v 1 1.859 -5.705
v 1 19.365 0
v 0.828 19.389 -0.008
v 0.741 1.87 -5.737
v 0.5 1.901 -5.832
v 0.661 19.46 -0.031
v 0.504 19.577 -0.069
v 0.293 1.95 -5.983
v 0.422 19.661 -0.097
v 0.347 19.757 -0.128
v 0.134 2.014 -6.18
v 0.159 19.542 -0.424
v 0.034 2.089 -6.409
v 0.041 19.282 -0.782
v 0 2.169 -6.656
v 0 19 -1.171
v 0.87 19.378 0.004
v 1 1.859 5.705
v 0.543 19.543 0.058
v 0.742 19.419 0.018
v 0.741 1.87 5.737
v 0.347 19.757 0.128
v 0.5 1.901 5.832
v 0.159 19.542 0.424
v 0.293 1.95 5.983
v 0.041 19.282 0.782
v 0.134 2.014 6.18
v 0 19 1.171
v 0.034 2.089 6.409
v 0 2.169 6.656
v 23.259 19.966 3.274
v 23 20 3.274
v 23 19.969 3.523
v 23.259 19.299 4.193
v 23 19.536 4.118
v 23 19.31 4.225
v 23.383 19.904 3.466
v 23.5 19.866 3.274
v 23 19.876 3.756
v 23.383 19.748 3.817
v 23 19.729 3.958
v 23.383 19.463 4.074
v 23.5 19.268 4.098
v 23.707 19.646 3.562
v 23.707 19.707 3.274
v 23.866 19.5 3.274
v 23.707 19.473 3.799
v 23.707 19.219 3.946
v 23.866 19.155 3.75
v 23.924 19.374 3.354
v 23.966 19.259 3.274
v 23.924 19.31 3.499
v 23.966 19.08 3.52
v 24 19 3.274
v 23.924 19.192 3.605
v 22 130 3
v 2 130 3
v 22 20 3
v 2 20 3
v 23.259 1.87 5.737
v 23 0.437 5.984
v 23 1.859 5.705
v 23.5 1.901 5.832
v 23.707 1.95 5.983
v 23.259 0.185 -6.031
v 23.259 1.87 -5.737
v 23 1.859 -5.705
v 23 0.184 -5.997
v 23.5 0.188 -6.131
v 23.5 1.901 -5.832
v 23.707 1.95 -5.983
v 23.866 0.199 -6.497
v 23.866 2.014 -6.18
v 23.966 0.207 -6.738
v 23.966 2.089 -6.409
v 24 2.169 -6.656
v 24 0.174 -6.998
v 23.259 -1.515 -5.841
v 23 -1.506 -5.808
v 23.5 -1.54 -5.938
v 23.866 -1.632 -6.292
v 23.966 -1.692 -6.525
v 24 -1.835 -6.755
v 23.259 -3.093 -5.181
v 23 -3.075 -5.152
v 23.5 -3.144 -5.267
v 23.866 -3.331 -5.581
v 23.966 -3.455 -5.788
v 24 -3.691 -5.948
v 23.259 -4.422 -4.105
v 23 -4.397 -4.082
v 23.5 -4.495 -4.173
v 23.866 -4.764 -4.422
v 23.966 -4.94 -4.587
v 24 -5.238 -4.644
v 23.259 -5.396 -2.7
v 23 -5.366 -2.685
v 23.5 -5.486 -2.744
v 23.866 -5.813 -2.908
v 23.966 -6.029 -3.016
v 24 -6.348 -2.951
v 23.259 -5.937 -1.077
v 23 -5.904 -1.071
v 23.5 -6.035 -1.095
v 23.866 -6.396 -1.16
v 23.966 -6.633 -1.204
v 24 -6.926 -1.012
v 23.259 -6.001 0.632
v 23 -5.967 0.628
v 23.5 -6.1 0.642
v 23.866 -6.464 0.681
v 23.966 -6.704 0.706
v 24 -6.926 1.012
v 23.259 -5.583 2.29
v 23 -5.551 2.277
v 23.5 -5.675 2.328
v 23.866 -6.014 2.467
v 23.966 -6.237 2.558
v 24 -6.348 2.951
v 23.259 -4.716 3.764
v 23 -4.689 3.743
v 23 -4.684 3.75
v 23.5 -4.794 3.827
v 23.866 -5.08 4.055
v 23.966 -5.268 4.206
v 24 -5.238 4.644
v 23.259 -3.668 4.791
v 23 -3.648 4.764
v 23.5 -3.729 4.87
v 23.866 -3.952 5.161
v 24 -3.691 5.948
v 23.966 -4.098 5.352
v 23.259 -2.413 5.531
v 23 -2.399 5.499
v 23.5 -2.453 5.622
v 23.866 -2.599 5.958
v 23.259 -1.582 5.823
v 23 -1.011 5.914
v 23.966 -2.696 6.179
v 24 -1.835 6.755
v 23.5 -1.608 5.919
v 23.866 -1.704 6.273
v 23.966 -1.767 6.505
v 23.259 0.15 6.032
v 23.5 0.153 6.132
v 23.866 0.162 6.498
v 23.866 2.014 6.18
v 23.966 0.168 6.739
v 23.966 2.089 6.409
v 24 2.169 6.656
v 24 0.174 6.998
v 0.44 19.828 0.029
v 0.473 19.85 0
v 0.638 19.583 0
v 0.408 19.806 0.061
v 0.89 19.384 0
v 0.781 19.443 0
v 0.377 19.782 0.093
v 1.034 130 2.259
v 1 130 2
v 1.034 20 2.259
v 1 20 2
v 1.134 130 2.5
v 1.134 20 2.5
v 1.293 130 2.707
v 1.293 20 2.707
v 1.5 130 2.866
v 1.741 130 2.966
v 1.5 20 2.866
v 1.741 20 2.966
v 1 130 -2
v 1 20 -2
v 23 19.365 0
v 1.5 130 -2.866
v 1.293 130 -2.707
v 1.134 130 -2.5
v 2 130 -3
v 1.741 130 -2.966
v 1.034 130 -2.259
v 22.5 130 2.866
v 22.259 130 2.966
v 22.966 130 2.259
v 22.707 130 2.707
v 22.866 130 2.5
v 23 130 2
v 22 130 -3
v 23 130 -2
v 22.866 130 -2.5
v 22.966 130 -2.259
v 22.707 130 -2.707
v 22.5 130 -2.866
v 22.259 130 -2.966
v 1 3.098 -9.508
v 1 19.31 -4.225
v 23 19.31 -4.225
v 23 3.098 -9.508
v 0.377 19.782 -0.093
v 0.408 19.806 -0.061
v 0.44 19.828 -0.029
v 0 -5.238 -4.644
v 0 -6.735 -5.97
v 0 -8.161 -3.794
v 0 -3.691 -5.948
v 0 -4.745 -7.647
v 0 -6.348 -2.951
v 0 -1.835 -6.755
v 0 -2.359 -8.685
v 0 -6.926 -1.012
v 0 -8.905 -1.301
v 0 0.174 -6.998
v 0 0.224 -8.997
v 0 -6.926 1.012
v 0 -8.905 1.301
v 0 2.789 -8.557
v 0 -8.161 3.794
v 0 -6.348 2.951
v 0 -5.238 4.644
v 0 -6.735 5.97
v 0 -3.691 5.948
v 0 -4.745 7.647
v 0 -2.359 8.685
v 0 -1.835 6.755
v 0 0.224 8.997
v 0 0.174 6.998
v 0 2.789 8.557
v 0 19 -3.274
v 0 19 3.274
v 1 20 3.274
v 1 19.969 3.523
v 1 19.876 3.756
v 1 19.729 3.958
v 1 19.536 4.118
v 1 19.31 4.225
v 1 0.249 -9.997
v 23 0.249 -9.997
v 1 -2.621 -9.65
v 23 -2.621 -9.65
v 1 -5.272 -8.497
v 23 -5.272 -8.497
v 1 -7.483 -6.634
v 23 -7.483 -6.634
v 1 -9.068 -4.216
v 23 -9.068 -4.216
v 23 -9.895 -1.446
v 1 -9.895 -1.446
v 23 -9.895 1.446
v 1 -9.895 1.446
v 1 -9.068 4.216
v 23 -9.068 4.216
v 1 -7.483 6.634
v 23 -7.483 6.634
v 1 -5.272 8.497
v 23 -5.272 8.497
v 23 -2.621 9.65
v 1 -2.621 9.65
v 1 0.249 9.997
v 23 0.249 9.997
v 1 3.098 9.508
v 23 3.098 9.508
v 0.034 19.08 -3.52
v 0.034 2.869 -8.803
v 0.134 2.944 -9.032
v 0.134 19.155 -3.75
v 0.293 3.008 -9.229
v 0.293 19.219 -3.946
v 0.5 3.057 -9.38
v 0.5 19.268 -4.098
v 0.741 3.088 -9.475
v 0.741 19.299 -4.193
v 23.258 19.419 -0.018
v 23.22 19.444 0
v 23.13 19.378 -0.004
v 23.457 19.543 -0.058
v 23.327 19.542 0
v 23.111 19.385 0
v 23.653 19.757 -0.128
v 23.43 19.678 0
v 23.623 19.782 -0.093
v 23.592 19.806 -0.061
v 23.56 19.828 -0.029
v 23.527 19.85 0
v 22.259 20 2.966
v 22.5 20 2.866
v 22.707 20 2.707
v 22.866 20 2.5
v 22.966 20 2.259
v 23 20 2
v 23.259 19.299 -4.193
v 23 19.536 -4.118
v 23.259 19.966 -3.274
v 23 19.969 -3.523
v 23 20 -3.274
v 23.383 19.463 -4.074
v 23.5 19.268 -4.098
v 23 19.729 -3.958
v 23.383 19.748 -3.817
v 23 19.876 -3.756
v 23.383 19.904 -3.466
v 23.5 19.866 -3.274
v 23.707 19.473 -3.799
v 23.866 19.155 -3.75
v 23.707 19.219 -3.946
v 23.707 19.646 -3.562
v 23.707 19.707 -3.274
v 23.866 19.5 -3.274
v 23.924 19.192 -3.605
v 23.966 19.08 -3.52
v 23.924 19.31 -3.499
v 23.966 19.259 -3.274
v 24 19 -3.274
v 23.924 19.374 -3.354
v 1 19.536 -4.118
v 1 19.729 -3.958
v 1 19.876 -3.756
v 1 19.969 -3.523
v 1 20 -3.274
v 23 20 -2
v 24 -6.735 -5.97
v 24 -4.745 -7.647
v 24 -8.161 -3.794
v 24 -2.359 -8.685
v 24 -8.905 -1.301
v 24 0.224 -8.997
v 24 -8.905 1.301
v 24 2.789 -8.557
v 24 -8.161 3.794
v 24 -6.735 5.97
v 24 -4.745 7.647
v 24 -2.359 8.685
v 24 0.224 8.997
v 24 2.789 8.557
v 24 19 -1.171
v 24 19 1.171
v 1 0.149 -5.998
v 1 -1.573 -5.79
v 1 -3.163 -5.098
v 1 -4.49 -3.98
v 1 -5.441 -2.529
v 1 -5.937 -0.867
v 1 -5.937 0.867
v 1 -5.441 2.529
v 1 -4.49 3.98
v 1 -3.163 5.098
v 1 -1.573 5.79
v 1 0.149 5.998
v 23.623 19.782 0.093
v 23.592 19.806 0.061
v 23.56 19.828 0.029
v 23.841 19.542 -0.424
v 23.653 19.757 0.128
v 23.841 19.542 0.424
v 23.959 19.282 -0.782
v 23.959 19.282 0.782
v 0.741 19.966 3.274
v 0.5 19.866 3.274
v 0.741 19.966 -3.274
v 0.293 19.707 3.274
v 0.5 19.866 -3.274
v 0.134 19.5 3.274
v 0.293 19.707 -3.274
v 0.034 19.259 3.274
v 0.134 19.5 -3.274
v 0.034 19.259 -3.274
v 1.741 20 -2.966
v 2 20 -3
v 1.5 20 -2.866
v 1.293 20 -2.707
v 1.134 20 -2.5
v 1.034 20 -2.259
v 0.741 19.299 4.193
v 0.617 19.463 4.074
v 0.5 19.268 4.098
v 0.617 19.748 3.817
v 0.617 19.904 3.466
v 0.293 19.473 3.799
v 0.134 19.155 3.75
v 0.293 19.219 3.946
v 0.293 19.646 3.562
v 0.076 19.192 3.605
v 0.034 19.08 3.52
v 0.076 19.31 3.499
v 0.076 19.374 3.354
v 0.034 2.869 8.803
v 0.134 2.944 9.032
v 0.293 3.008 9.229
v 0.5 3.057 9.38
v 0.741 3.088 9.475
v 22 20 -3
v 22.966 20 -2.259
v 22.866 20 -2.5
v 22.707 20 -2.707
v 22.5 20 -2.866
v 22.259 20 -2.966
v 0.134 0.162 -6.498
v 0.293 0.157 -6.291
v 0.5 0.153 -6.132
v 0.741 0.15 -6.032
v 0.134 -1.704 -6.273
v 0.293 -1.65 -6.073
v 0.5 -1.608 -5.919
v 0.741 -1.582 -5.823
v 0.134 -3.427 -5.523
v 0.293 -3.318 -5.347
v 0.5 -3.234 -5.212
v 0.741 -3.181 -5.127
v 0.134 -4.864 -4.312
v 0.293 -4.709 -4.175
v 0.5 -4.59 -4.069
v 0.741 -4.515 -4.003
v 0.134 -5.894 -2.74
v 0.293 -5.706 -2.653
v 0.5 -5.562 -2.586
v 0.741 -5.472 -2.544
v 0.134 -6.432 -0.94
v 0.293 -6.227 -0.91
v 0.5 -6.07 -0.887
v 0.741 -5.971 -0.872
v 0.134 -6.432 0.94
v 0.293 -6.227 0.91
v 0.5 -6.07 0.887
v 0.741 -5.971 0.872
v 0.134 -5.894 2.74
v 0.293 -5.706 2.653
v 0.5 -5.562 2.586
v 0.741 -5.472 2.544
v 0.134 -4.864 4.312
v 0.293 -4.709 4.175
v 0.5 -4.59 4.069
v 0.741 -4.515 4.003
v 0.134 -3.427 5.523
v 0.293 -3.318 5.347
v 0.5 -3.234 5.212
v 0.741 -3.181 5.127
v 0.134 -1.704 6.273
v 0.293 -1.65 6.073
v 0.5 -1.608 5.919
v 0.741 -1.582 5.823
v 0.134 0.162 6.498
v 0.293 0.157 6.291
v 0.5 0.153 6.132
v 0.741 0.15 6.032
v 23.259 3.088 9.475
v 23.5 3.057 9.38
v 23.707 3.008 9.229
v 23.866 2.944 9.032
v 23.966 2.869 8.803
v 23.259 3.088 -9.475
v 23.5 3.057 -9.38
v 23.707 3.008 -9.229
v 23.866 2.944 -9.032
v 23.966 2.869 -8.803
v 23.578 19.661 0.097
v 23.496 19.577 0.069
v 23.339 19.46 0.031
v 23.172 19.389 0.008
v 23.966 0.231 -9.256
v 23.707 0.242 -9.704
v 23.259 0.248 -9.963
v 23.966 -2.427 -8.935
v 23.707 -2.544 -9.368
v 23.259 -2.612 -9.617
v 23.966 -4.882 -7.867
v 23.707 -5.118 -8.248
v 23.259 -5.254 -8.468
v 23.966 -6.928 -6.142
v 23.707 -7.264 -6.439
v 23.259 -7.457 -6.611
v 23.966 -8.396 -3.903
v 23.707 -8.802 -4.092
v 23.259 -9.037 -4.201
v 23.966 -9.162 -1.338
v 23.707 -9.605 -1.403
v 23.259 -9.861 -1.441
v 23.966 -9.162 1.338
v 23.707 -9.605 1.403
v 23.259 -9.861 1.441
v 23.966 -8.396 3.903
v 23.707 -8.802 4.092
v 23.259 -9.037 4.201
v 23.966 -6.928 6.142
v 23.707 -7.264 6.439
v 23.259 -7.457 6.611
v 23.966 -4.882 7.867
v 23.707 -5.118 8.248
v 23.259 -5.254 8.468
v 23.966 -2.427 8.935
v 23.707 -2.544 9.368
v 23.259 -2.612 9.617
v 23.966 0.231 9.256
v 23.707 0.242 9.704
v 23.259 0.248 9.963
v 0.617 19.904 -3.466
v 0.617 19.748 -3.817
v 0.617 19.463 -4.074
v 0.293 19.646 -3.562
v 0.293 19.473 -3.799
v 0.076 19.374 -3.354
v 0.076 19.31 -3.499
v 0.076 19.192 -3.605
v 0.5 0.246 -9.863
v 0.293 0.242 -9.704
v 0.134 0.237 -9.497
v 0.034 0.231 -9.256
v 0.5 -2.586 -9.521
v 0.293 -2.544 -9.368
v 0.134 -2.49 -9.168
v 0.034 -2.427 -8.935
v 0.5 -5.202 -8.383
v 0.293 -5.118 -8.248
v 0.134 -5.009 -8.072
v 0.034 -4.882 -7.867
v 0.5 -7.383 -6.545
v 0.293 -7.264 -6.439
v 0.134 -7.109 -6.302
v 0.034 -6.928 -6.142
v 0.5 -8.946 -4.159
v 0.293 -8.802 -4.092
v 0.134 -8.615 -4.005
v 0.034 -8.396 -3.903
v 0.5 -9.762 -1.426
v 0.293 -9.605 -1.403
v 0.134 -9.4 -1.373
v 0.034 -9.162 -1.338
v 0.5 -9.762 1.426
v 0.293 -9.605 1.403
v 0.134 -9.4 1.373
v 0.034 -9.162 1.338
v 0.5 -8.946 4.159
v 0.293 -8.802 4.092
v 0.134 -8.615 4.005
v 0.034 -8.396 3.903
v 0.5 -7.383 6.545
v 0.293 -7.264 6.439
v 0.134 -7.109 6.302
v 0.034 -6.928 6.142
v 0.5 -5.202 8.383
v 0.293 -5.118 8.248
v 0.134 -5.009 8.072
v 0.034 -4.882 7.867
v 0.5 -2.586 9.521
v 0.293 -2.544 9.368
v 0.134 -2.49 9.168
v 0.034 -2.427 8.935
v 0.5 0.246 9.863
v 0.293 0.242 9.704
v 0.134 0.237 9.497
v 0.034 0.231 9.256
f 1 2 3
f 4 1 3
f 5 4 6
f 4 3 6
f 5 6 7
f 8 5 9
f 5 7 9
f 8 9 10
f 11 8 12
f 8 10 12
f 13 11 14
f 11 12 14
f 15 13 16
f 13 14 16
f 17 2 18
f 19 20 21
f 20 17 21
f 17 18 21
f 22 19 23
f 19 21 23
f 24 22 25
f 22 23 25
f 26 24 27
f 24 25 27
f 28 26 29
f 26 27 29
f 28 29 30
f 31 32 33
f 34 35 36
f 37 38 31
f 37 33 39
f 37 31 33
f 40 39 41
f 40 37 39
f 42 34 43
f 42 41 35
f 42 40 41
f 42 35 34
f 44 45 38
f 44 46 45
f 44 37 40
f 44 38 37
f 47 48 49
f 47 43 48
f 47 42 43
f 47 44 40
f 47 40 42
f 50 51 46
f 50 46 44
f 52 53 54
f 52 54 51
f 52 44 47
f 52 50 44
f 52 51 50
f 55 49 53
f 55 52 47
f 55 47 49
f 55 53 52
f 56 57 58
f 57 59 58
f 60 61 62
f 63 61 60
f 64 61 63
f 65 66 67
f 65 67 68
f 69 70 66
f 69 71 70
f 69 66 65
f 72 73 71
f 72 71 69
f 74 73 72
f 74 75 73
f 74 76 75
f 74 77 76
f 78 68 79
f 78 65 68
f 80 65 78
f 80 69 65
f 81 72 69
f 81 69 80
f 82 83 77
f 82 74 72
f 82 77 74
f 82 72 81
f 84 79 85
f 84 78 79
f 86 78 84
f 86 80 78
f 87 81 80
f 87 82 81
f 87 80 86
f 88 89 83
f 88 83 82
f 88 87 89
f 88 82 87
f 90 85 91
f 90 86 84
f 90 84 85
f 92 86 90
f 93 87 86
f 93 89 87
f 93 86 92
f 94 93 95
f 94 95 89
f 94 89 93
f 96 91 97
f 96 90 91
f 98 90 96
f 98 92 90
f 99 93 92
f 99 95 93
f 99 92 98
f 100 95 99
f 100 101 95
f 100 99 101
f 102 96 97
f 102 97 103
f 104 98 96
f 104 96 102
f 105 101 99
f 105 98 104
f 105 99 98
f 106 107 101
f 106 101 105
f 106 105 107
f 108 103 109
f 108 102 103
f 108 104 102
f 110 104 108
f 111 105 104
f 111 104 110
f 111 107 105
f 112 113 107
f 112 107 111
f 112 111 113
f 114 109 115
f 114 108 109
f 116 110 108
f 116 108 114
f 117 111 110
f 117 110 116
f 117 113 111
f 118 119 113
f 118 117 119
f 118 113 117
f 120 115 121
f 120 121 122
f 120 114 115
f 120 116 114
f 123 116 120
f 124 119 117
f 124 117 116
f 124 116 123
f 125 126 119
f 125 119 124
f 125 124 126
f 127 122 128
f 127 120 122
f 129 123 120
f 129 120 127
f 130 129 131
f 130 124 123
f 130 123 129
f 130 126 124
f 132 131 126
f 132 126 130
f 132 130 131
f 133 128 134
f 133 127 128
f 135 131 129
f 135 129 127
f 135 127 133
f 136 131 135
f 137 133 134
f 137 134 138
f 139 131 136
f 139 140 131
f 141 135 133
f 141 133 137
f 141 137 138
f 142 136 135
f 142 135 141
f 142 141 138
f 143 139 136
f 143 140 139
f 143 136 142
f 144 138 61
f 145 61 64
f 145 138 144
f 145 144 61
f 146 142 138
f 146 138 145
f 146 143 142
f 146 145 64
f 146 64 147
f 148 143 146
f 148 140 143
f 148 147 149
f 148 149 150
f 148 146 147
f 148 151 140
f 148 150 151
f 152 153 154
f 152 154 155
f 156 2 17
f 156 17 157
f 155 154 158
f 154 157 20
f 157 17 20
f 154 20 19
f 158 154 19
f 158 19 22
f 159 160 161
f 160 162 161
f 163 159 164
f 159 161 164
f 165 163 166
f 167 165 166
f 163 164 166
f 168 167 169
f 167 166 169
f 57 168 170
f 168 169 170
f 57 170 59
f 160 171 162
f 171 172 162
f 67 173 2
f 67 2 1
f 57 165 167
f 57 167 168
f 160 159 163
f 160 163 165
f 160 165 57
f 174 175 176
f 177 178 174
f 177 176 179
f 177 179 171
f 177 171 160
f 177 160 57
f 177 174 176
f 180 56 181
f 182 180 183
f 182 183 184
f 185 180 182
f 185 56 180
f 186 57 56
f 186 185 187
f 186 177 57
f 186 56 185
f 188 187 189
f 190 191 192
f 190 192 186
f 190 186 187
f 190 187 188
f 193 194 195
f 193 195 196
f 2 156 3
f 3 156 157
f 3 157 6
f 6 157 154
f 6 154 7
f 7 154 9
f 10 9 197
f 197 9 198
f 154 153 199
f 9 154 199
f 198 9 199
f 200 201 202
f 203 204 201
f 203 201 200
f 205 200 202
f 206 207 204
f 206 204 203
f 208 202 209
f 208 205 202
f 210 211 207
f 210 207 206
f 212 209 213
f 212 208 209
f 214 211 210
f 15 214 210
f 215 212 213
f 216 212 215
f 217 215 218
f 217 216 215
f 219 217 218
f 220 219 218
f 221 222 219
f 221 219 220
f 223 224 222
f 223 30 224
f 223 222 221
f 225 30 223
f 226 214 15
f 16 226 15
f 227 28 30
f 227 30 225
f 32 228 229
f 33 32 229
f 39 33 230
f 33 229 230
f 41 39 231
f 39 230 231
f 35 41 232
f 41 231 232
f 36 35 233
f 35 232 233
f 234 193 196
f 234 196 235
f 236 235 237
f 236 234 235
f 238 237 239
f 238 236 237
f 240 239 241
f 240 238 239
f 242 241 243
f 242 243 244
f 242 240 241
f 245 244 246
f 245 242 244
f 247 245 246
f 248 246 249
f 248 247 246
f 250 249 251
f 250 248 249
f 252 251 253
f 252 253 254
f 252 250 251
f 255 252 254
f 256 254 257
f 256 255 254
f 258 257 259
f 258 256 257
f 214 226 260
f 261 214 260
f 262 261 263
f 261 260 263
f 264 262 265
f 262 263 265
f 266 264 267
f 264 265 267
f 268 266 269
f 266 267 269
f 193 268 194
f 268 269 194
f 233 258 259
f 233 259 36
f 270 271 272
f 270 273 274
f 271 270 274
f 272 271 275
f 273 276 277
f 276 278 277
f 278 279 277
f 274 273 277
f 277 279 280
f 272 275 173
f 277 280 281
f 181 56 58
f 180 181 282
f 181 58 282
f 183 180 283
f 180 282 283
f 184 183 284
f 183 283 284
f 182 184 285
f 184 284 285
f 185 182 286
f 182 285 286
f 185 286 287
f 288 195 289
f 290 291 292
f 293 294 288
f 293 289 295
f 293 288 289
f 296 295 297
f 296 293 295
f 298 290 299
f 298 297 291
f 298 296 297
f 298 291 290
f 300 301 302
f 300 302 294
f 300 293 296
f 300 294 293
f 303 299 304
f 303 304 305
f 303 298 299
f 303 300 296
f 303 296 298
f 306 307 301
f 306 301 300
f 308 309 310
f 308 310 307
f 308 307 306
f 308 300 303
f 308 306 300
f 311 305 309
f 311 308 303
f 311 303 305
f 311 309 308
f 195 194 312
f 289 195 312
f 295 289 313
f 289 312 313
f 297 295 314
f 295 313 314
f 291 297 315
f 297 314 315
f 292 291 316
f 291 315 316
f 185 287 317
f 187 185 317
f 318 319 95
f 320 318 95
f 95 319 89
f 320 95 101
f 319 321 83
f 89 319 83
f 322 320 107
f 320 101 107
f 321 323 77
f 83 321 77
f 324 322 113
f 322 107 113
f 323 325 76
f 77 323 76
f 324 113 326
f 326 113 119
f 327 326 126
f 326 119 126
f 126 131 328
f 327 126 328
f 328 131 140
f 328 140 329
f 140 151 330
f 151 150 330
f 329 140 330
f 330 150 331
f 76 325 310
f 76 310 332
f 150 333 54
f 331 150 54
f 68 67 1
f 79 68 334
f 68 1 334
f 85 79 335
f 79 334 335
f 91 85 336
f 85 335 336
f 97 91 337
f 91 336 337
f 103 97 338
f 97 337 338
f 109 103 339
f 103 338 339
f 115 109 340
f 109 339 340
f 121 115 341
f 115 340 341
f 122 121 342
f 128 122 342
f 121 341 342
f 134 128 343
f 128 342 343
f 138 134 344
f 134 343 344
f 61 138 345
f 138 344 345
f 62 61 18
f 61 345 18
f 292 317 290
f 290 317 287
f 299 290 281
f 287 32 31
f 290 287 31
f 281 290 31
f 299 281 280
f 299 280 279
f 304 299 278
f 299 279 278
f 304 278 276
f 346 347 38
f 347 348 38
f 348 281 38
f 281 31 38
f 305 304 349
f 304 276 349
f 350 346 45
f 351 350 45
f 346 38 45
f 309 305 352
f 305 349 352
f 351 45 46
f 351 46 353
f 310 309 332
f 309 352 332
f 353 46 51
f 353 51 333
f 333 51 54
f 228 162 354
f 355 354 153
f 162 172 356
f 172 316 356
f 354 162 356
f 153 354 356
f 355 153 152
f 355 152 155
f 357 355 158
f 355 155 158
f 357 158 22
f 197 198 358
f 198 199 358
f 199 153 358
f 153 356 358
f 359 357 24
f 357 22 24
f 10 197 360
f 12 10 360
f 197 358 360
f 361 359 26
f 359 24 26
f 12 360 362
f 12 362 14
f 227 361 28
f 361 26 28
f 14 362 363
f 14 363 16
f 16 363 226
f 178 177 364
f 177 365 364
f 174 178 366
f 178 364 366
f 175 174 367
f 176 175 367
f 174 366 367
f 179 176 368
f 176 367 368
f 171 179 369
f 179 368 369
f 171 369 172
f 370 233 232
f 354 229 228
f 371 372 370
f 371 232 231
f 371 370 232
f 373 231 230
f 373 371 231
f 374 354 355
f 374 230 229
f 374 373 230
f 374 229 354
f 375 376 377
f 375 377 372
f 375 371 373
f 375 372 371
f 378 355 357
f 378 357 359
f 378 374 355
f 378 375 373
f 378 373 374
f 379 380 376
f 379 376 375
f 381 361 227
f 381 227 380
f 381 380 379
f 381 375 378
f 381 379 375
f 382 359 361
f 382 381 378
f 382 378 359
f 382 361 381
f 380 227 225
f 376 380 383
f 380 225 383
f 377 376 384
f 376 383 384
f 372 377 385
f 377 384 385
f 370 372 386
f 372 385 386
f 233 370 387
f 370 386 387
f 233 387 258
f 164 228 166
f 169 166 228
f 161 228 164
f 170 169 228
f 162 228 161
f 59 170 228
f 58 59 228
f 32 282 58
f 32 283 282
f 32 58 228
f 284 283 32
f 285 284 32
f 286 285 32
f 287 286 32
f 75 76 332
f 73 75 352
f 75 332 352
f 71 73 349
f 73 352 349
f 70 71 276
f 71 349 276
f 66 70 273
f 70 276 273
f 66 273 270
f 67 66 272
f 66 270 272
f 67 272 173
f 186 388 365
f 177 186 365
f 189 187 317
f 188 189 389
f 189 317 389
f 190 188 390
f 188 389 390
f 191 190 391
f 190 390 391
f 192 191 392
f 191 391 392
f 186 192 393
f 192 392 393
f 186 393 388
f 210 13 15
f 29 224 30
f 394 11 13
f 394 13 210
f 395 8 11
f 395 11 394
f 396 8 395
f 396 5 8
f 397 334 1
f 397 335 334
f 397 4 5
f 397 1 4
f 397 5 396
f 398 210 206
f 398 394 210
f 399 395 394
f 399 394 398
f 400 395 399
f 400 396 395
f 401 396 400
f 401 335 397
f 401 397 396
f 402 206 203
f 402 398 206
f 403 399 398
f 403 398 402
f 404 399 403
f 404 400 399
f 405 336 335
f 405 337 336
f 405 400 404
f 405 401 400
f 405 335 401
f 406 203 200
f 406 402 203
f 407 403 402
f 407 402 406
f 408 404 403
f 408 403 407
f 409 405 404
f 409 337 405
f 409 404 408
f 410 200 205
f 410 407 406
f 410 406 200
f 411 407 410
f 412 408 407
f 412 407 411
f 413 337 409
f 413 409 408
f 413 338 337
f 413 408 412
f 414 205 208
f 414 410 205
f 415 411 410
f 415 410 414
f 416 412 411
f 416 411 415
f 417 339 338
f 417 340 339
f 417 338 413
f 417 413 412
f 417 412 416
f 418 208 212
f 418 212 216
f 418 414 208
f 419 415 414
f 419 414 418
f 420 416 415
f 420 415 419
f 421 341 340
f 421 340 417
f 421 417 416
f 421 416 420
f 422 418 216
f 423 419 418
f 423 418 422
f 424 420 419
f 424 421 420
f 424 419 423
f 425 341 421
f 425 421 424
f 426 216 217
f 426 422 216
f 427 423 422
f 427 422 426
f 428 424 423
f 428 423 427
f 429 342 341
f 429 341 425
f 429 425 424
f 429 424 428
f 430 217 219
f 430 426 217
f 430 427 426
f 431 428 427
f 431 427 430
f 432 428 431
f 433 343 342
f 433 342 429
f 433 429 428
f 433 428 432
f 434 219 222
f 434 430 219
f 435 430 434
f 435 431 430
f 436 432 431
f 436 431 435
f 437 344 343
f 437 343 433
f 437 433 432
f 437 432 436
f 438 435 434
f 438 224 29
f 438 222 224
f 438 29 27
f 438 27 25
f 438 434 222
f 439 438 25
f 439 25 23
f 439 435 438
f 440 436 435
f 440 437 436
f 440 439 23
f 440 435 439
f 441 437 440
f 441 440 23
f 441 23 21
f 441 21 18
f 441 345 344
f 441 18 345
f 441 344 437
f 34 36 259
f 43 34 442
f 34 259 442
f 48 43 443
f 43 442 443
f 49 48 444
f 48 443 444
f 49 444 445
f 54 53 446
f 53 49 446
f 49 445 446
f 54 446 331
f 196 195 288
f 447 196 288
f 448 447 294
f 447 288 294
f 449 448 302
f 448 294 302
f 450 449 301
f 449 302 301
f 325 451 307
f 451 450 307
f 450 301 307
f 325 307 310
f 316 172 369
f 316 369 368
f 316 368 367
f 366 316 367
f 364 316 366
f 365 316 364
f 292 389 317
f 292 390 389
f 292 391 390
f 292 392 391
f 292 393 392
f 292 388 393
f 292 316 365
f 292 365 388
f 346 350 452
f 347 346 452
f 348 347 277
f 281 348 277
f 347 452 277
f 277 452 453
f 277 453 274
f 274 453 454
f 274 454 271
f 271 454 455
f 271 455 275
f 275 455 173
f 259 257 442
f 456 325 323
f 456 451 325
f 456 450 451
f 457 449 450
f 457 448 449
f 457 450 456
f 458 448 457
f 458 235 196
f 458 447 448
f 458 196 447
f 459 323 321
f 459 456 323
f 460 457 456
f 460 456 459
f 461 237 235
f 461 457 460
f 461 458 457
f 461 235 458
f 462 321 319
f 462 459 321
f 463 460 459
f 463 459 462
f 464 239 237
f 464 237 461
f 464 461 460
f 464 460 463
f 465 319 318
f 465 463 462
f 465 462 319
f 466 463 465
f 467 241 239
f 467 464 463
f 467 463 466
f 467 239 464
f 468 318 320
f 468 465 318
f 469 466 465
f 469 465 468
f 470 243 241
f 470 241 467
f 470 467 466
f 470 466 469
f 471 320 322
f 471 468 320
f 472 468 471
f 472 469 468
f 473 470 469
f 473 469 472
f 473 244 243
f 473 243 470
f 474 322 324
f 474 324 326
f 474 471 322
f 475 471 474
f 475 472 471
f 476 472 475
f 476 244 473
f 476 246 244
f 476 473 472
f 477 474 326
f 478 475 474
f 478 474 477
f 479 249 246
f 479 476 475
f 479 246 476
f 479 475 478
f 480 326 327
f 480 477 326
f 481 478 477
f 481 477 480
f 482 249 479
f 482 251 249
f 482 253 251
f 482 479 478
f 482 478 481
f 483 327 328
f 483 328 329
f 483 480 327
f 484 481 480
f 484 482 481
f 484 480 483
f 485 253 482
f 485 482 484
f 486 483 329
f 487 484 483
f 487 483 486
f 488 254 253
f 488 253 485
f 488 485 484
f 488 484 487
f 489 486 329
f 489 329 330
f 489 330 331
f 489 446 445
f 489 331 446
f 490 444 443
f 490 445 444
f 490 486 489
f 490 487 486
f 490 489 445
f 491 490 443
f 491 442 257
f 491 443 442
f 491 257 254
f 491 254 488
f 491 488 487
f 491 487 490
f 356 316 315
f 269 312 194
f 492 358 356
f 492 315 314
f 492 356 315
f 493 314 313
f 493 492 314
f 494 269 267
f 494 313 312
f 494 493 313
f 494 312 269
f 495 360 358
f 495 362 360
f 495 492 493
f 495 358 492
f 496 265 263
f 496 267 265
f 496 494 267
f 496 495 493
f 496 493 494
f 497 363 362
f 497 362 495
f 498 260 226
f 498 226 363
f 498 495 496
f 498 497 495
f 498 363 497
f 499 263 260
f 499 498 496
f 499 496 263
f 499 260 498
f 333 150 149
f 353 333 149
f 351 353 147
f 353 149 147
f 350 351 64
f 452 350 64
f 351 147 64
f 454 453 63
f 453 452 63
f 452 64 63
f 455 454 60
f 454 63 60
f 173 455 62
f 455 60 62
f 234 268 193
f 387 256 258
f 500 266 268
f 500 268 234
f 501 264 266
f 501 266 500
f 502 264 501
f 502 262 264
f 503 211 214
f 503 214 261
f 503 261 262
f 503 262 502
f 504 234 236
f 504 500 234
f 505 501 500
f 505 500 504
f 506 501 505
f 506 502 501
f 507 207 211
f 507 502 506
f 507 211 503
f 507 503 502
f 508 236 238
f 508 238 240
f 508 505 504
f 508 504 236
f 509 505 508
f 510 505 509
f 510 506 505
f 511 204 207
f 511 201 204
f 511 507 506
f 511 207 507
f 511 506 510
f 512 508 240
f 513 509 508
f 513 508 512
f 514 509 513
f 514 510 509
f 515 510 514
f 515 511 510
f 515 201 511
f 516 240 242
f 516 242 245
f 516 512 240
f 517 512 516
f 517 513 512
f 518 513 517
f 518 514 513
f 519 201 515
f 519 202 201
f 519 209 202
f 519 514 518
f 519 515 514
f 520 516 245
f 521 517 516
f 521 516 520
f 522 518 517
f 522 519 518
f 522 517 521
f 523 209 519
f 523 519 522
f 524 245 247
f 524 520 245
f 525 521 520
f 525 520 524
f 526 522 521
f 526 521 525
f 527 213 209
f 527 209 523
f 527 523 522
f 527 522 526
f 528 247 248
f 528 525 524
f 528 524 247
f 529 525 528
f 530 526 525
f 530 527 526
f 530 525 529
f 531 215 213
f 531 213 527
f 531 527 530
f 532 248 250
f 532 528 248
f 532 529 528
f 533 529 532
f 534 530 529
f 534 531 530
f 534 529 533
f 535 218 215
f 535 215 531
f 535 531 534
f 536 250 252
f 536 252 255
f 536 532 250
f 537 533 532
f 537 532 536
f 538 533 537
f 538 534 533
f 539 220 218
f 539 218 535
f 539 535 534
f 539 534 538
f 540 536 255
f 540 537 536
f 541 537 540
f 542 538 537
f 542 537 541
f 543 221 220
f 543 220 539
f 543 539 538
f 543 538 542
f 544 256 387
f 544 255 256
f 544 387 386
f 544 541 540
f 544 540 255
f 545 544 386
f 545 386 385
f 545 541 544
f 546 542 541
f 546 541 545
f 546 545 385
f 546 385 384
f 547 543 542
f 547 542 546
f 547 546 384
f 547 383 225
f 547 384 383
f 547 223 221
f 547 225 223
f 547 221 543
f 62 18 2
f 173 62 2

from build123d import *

# Parameters (mm, degrees)
BOSS_EXTRUDE1_DEPTH = 24
SKETCH2_W           = 24
SKETCH2_H           = 8
SKETCH2_W_2         = 22
SKETCH2_H_2         = 6
CUT_EXTRUDE1_DEPTH  = 40
FILLET1_R           = 1
FILLET2_R           = 1
BOSS_EXTRUDE2_DEPTH = 70


with BuildPart() as part:
    # Sketch1 → Boss-Extrude1 (new body)
    with BuildSketch(Plane(origin=(0, 0, 0), x_dir=(0, 0, -1), z_dir=(1, 0, 0))):
        with BuildLine():
            Line((-9.507879247, 3.098424151), (-4, 20))
            Line((-4, 20), (-4, 60))
            Line((-4, 60), (4, 60))
            Line((4, 60), (4, 20))
            Line((4, 20), (9.507879247, 3.098424151))
            ThreePointArc((9.507879247, 3.098424151), (0, -10), (-9.507879247, 3.098424151))
        make_face()
        with BuildLine():
            Line((-5.704727548, 1.85905449), (0, 19.364682524))
            Line((0, 19.364682524), (5.704727548, 1.85905449))
            ThreePointArc((5.704727548, 1.85905449), (0, -6), (-5.704727548, 1.85905449))
        make_face(mode=Mode.SUBTRACT)
    extrude(amount=BOSS_EXTRUDE1_DEPTH)

    # Sketch2 → Cut-Extrude1 (cut)
    with BuildSketch(Plane(origin=(0, 60, 0), x_dir=(1, 0, 0), z_dir=(0, 1, 0))):
        with Locations((12, 0)):
            Rectangle(SKETCH2_W, SKETCH2_H)
        with Locations((12, 0)):
            Rectangle(SKETCH2_W_2, SKETCH2_H_2, mode=Mode.SUBTRACT)
    extrude(amount=-CUT_EXTRUDE1_DEPTH, mode=Mode.SUBTRACT)

    # Fillet1
    # the kernel refuses this fillet: 1 mm, written as the material it takes off along each edge
    with BuildSketch(Plane(origin=(1, 19, 3.274120372), x_dir=(0, 0.3098424150516233, 0.9507879247418836), z_dir=(-1, 0, 0))) as fillet1_piece_1_section:
        Polygon((0, 0), (FILLET1_R * 1.02, 0), (FILLET1_R * 1.02, FILLET1_R * 0.740397220377), (FILLET1_R * 0.316039263353, FILLET1_R * 0.969803683237), align=None)
    fillet1_piece_1 = extrude(amount=FILLET1_R * 1.02, mode=Mode.PRIVATE)
    fillet1_piece_1 = fillet1_piece_1 - Plane(origin=(1, 19, 3.274120372), x_dir=(0, -0.8092720231948041, -0.5874340750026239), z_dir=(-1, 0, 0)) * Sphere(FILLET1_R, mode=Mode.PRIVATE)
    add(fillet1_piece_1, mode=Mode.SUBTRACT)
    with BuildSketch(Plane(origin=(23, 19, 3.274120372), x_dir=(0, 0.3098424150516233, 0.9507879247418836), z_dir=(1, 0, 0))) as fillet1_piece_2_section:
        Polygon((0, 0), (FILLET1_R * 1.02, 0), (FILLET1_R * 1.02, -FILLET1_R * 0.740397220377), (FILLET1_R * 0.316039263353, -FILLET1_R * 0.969803683237), align=None)
    fillet1_piece_2 = extrude(amount=FILLET1_R * 1.02, mode=Mode.PRIVATE)
    fillet1_piece_2 = fillet1_piece_2 - Plane(origin=(23, 19, 3.274120372), x_dir=(0, -0.8092720231948041, -0.5874340750026239), z_dir=(1, 0, 0)) * Sphere(FILLET1_R, mode=Mode.PRIVATE)
    add(fillet1_piece_2, mode=Mode.SUBTRACT)
    with BuildSketch(Plane(origin=(1, 19, -3.274120372), x_dir=(0, 0.3098424150516232, -0.9507879247418838), z_dir=(-1, 0, 0))) as fillet1_piece_3_section:
        Polygon((0, 0), (FILLET1_R * 1.02, 0), (FILLET1_R * 1.02, -FILLET1_R * 0.740397220377), (FILLET1_R * 0.316039263353, -FILLET1_R * 0.969803683237), align=None)
    fillet1_piece_3 = extrude(amount=FILLET1_R * 1.02, mode=Mode.PRIVATE)
    fillet1_piece_3 = fillet1_piece_3 - Plane(origin=(1, 19, -3.274120372), x_dir=(0, -0.8092720231948041, 0.587434075002624), z_dir=(-1, 0, 0)) * Sphere(FILLET1_R, mode=Mode.PRIVATE)
    add(fillet1_piece_3, mode=Mode.SUBTRACT)
    with BuildSketch(Plane(origin=(23, 19, -3.274120372), x_dir=(0, 0.3098424150516232, -0.9507879247418838), z_dir=(1, 0, 0))) as fillet1_piece_4_section:
        Polygon((0, 0), (FILLET1_R * 1.02, 0), (FILLET1_R * 1.02, FILLET1_R * 0.740397220377), (FILLET1_R * 0.316039263353, FILLET1_R * 0.969803683237), align=None)
    fillet1_piece_4 = extrude(amount=FILLET1_R * 1.02, mode=Mode.PRIVATE)
    fillet1_piece_4 = fillet1_piece_4 - Plane(origin=(23, 19, -3.274120372), x_dir=(0, -0.8092720231948041, 0.587434075002624), z_dir=(1, 0, 0)) * Sphere(FILLET1_R, mode=Mode.PRIVATE)
    add(fillet1_piece_4, mode=Mode.SUBTRACT)
    with BuildSketch(Plane(origin=(1, 20, 4), x_dir=(0, -0.9507879247418841, 0.30984241505162113), z_dir=(1, 0, 0)), Plane(origin=(1, 20, -4), x_dir=(0, 0, 1), z_dir=(1, 0, 0))) as fillet1_piece_5:
        with BuildLine():
            CenterArc((FILLET1_R * 0.725879627821, FILLET1_R), FILLET1_R, 198.04973395, 71.95026605)
            Line((-FILLET1_R * 0.224908296921, FILLET1_R * 0.690157584948), (-FILLET1_R * 0.243924055416, FILLET1_R * 0.683960736647))
            Line((-FILLET1_R * 0.243924055416, FILLET1_R * 0.683960736647), (-FILLET1_R * 0.0145175925564, -FILLET1_R * 0.02))
            Line((-FILLET1_R * 0.0145175925564, -FILLET1_R * 0.02), (FILLET1_R * 0.725879627821, -FILLET1_R * 0.02))
            Line((FILLET1_R * 0.725879627821, -FILLET1_R * 0.02), (FILLET1_R * 0.725879627821, 0))
        make_face()
    extrude(amount=22, mode=Mode.SUBTRACT)
    with BuildSketch(Plane(origin=(0, 0, 0), x_dir=(0, 0.3098424150516232, -0.9507879247418836), z_dir=(0, 0.9507879247418836, 0.3098424150516232))) as fillet1_piece_6:
        with BuildLine():
            CenterArc((6 + FILLET1_R, -FILLET1_R), FILLET1_R, 90, 90)
            Line((6, -FILLET1_R), (6 - FILLET1_R * 0.02, -FILLET1_R))
            Line((6 - FILLET1_R * 0.02, -FILLET1_R), (6 - FILLET1_R * 0.02, FILLET1_R * 0.02))
            Line((6 - FILLET1_R * 0.02, FILLET1_R * 0.02), (6 + FILLET1_R, FILLET1_R * 0.02))
            Line((6 + FILLET1_R, FILLET1_R * 0.02), (6 + FILLET1_R, 0))
        make_face()
    revolve(axis=Axis((0, 0, 0), (-1, 0, 0)), revolution_arc=216.0994679, mode=Mode.SUBTRACT)
    with BuildSketch(Plane(origin=(0, 21.741652336, 0.774606038), x_dir=(0, 0.30984241505162313, -0.9507879247418837), z_dir=(0, -0.9507879247418837, -0.30984241505162313))) as fillet1_piece_7_section:
        with BuildLine():
            CenterArc((FILLET1_R, FILLET1_R), FILLET1_R, 180, 90)
            Line((0, FILLET1_R), (-FILLET1_R * 0.02, FILLET1_R))
            Line((-FILLET1_R * 0.02, FILLET1_R), (-FILLET1_R * 0.02, -FILLET1_R * 0.02))
            Line((-FILLET1_R * 0.02, -FILLET1_R * 0.02), (FILLET1_R, -FILLET1_R * 0.02))
            Line((FILLET1_R, -FILLET1_R * 0.02), (FILLET1_R, 0))
        make_face()
    fillet1_piece_7 = extrude(amount=20.91170631, mode=Mode.PRIVATE)
    fillet1_piece_7 = split(fillet1_piece_7, bisect_by=Plane(origin=(0.224383955, 12.542231939, 2.223297658), z_dir=(0, -0.30984241505162313, -0.9507879247418837)), keep=Keep.TOP, mode=Mode.PRIVATE)
    add(fillet1_piece_7, mode=Mode.SUBTRACT)
    with BuildSketch(Plane(origin=(24, 3.098424151, 9.507879247), x_dir=(-1, 0, 0), z_dir=(0, 0.9507879247418836, -0.3098424150516233)), Plane(origin=(0, 19.309842415, -4.224908297), x_dir=(0, -0.3098424150516232, 0.9507879247418837), z_dir=(0, -0.9507879247418837, -0.3098424150516232))) as fillet1_piece_8:
        with BuildLine():
            CenterArc((FILLET1_R, -FILLET1_R), FILLET1_R, 90, 90)
            Line((0, -FILLET1_R), (-FILLET1_R * 0.02, -FILLET1_R))
            Line((-FILLET1_R * 0.02, -FILLET1_R), (-FILLET1_R * 0.02, FILLET1_R * 0.02))
            Line((-FILLET1_R * 0.02, FILLET1_R * 0.02), (FILLET1_R, FILLET1_R * 0.02))
            Line((FILLET1_R, FILLET1_R * 0.02), (FILLET1_R, 0))
        make_face()
    extrude(amount=17.050509207, mode=Mode.SUBTRACT)
    with BuildSketch(Plane(origin=(0, 1.85905449, 5.704727548), x_dir=(0, 0.3098424150516232, 0.9507879247418837), z_dir=(0, 0.9507879247418837, -0.30984241505162313))) as fillet1_piece_9_section:
        with BuildLine():
            CenterArc((FILLET1_R, FILLET1_R), FILLET1_R, 180, 90)
            Line((0, FILLET1_R), (-FILLET1_R * 0.02, FILLET1_R))
            Line((-FILLET1_R * 0.02, FILLET1_R), (-FILLET1_R * 0.02, -FILLET1_R * 0.02))
            Line((-FILLET1_R * 0.02, -FILLET1_R * 0.02), (FILLET1_R, -FILLET1_R * 0.02))
            Line((FILLET1_R, -FILLET1_R * 0.02), (FILLET1_R, 0))
        make_face()
    fillet1_piece_9 = extrude(amount=20.91170631, mode=Mode.PRIVATE)
    fillet1_piece_9 = split(fillet1_piece_9, bisect_by=Plane(origin=(0.224383955, 12.542231939, -2.223297658), z_dir=(0, -0.30984241505162313, 0.9507879247418837)), keep=Keep.TOP, mode=Mode.PRIVATE)
    add(fillet1_piece_9, mode=Mode.SUBTRACT)
    with BuildSketch(Plane(origin=(24, 0, 0), x_dir=(0, 0.3098424150516232, -0.9507879247418836), z_dir=(0, 0.9507879247418836, 0.3098424150516232))) as fillet1_piece_10:
        with BuildLine():
            CenterArc((6 + FILLET1_R, FILLET1_R), FILLET1_R, 180, 90)
            Line((6, FILLET1_R), (6 - FILLET1_R * 0.02, FILLET1_R))
            Line((6 - FILLET1_R * 0.02, FILLET1_R), (6 - FILLET1_R * 0.02, -FILLET1_R * 0.02))
            Line((6 - FILLET1_R * 0.02, -FILLET1_R * 0.02), (6 + FILLET1_R, -FILLET1_R * 0.02))
            Line((6 + FILLET1_R, -FILLET1_R * 0.02), (6 + FILLET1_R, 0))
        make_face()
    revolve(axis=Axis((24, 0, 0), (-1, 0, 0)), revolution_arc=216.0994679, mode=Mode.SUBTRACT)
    with BuildSketch(Plane(origin=(24, 21.741652336, 0.774606038), x_dir=(0, 0.30984241505162313, -0.9507879247418837), z_dir=(0, -0.9507879247418837, -0.30984241505162313))) as fillet1_piece_11_section:
        with BuildLine():
            CenterArc((FILLET1_R, -FILLET1_R), FILLET1_R, 90, 90)
            Line((0, -FILLET1_R), (-FILLET1_R * 0.02, -FILLET1_R))
            Line((-FILLET1_R * 0.02, -FILLET1_R), (-FILLET1_R * 0.02, FILLET1_R * 0.02))
            Line((-FILLET1_R * 0.02, FILLET1_R * 0.02), (FILLET1_R, FILLET1_R * 0.02))
            Line((FILLET1_R, FILLET1_R * 0.02), (FILLET1_R, 0))
        make_face()
    fillet1_piece_11 = extrude(amount=20.91170631, mode=Mode.PRIVATE)
    fillet1_piece_11 = split(fillet1_piece_11, bisect_by=Plane(origin=(23.775616045, 12.542231939, 2.223297658), z_dir=(0, -0.30984241505162313, -0.9507879247418837)), keep=Keep.TOP, mode=Mode.PRIVATE)
    add(fillet1_piece_11, mode=Mode.SUBTRACT)
    with BuildSketch(Plane(origin=(24, 1.85905449, 5.704727548), x_dir=(0, 0.3098424150516232, 0.9507879247418837), z_dir=(0, 0.9507879247418837, -0.30984241505162313))) as fillet1_piece_12_section:
        with BuildLine():
            CenterArc((FILLET1_R, -FILLET1_R), FILLET1_R, 90, 90)
            Line((0, -FILLET1_R), (-FILLET1_R * 0.02, -FILLET1_R))
            Line((-FILLET1_R * 0.02, -FILLET1_R), (-FILLET1_R * 0.02, FILLET1_R * 0.02))
            Line((-FILLET1_R * 0.02, FILLET1_R * 0.02), (FILLET1_R, FILLET1_R * 0.02))
            Line((FILLET1_R, FILLET1_R * 0.02), (FILLET1_R, 0))
        make_face()
    fillet1_piece_12 = extrude(amount=20.91170631, mode=Mode.PRIVATE)
    fillet1_piece_12 = split(fillet1_piece_12, bisect_by=Plane(origin=(23.775616045, 12.542231939, -2.223297658), z_dir=(0, -0.30984241505162313, 0.9507879247418837)), keep=Keep.TOP, mode=Mode.PRIVATE)
    add(fillet1_piece_12, mode=Mode.SUBTRACT)
    with BuildSketch(Plane(origin=(24, 20, 3.274120372), x_dir=(-1, 0, 0), z_dir=(0, 0, -1)), Plane(origin=(0, 20, -3.274120372), x_dir=(1, 0, 0), z_dir=(0, 0, 1))) as fillet1_piece_13:
        with BuildLine():
            CenterArc((FILLET1_R, -FILLET1_R), FILLET1_R, 90, 90)
            Line((0, -FILLET1_R), (-FILLET1_R * 0.02, -FILLET1_R))
            Line((-FILLET1_R * 0.02, -FILLET1_R), (-FILLET1_R * 0.02, FILLET1_R * 0.02))
            Line((-FILLET1_R * 0.02, FILLET1_R * 0.02), (FILLET1_R, FILLET1_R * 0.02))
            Line((FILLET1_R, FILLET1_R * 0.02), (FILLET1_R, 0))
        make_face()
    extrude(amount=6.548240744, mode=Mode.SUBTRACT)
    with BuildSketch(Plane(origin=(24, 0, 0), x_dir=(0, 0.3098424150516232, -0.9507879247418837), z_dir=(0, 0.9507879247418837, 0.3098424150516232))) as fillet1_piece_14:
        with BuildLine():
            CenterArc((10 - FILLET1_R, FILLET1_R), FILLET1_R, 270, 90)
            Line((10 - FILLET1_R, 0), (10 - FILLET1_R, -FILLET1_R * 0.02))
            Line((10 - FILLET1_R, -FILLET1_R * 0.02), (10 + FILLET1_R * 0.02, -FILLET1_R * 0.02))
            Line((10 + FILLET1_R * 0.02, -FILLET1_R * 0.02), (10 + FILLET1_R * 0.02, FILLET1_R))
            Line((10 + FILLET1_R * 0.02, FILLET1_R), (10, FILLET1_R))
        make_face()
    revolve(axis=Axis((24, 0, 0), (-1, 0, 0)), revolution_arc=216.0994679, mode=Mode.SUBTRACT)
    with BuildSketch(Plane(origin=(0, 3.098424151, 9.507879247), x_dir=(1, 0, 0), z_dir=(0, 0.9507879247418836, -0.3098424150516233)), Plane(origin=(24, 19.309842415, -4.224908297), x_dir=(0, -0.3098424150516232, 0.9507879247418837), z_dir=(0, -0.9507879247418837, -0.3098424150516232))) as fillet1_piece_15:
        with BuildLine():
            CenterArc((FILLET1_R, FILLET1_R), FILLET1_R, 180, 90)
            Line((0, FILLET1_R), (-FILLET1_R * 0.02, FILLET1_R))
            Line((-FILLET1_R * 0.02, FILLET1_R), (-FILLET1_R * 0.02, -FILLET1_R * 0.02))
            Line((-FILLET1_R * 0.02, -FILLET1_R * 0.02), (FILLET1_R, -FILLET1_R * 0.02))
            Line((FILLET1_R, -FILLET1_R * 0.02), (FILLET1_R, 0))
        make_face()
    extrude(amount=17.050509207, mode=Mode.SUBTRACT)
    with BuildSketch(Plane(origin=(0, 0, 0), x_dir=(0, 0.3098424150516232, -0.9507879247418837), z_dir=(0, 0.9507879247418837, 0.3098424150516232))) as fillet1_piece_16:
        with BuildLine():
            CenterArc((10 - FILLET1_R, -FILLET1_R), FILLET1_R, 0, 90)
            Line((10 - FILLET1_R, 0), (10 - FILLET1_R, FILLET1_R * 0.02))
            Line((10 - FILLET1_R, FILLET1_R * 0.02), (10 + FILLET1_R * 0.02, FILLET1_R * 0.02))
            Line((10 + FILLET1_R * 0.02, FILLET1_R * 0.02), (10 + FILLET1_R * 0.02, -FILLET1_R))
            Line((10 + FILLET1_R * 0.02, -FILLET1_R), (10, -FILLET1_R))
        make_face()
    revolve(axis=Axis((0, 0, 0), (-1, 0, 0)), revolution_arc=216.0994679, mode=Mode.SUBTRACT)
    with BuildSketch(Plane(origin=(0, 21.741652336, 0.774606038), x_dir=(0, 0.30984241505162313, -0.9507879247418837), z_dir=(0, -0.9507879247418837, -0.30984241505162313))) as fillet1_piece_17a_section:
        with BuildLine():
            CenterArc((FILLET1_R, FILLET1_R), FILLET1_R, 180, 90)
            Line((0, FILLET1_R), (-FILLET1_R * 0.02, FILLET1_R))
            Line((-FILLET1_R * 0.02, FILLET1_R), (-FILLET1_R * 0.02, -FILLET1_R * 0.02))
            Line((-FILLET1_R * 0.02, -FILLET1_R * 0.02), (FILLET1_R, -FILLET1_R * 0.02))
            Line((FILLET1_R, -FILLET1_R * 0.02), (FILLET1_R, 0))
        make_face()
    fillet1_piece_17a = extrude(amount=20.91170631, mode=Mode.PRIVATE)
    fillet1_piece_17a = split(fillet1_piece_17a, bisect_by=Plane(origin=(0.243592095, 20.539413838, -0.382821003), z_dir=(0, 0.30984241505162313, 0.9507879247418837)), keep=Keep.TOP, mode=Mode.PRIVATE)
    with BuildSketch(Plane(origin=(0, 1.85905449, 5.704727548), x_dir=(0, 0.3098424150516232, 0.9507879247418837), z_dir=(0, 0.9507879247418837, -0.30984241505162313))) as fillet1_piece_17b_section:
        with BuildLine():
            CenterArc((FILLET1_R, FILLET1_R), FILLET1_R, 180, 90)
            Line((0, FILLET1_R), (-FILLET1_R * 0.02, FILLET1_R))
            Line((-FILLET1_R * 0.02, FILLET1_R), (-FILLET1_R * 0.02, -FILLET1_R * 0.02))
            Line((-FILLET1_R * 0.02, -FILLET1_R * 0.02), (FILLET1_R, -FILLET1_R * 0.02))
            Line((FILLET1_R, -FILLET1_R * 0.02), (FILLET1_R, 0))
        make_face()
    fillet1_piece_17b = extrude(amount=20.91170631, mode=Mode.PRIVATE)
    fillet1_piece_17b = split(fillet1_piece_17b, bisect_by=Plane(origin=(0.243592095, 20.539413838, 0.382821003), z_dir=(0, 0.30984241505162313, -0.9507879247418837)), keep=Keep.TOP, mode=Mode.PRIVATE)
    fillet1_piece_17 = fillet1_piece_17a & fillet1_piece_17b
    add(fillet1_piece_17, mode=Mode.SUBTRACT)
    with BuildSketch(Plane(origin=(24, 21.741652336, 0.774606038), x_dir=(0, 0.30984241505162313, -0.9507879247418837), z_dir=(0, -0.9507879247418837, -0.30984241505162313))) as fillet1_piece_18a_section:
        with BuildLine():
            CenterArc((FILLET1_R, -FILLET1_R), FILLET1_R, 90, 90)
            Line((0, -FILLET1_R), (-FILLET1_R * 0.02, -FILLET1_R))
            Line((-FILLET1_R * 0.02, -FILLET1_R), (-FILLET1_R * 0.02, FILLET1_R * 0.02))
            Line((-FILLET1_R * 0.02, FILLET1_R * 0.02), (FILLET1_R, FILLET1_R * 0.02))
            Line((FILLET1_R, FILLET1_R * 0.02), (FILLET1_R, 0))
        make_face()
    fillet1_piece_18a = extrude(amount=20.91170631, mode=Mode.PRIVATE)
    fillet1_piece_18a = split(fillet1_piece_18a, bisect_by=Plane(origin=(23.756407905, 20.539413838, -0.382821003), z_dir=(0, 0.30984241505162313, 0.9507879247418837)), keep=Keep.TOP, mode=Mode.PRIVATE)
    with BuildSketch(Plane(origin=(24, 1.85905449, 5.704727548), x_dir=(0, 0.3098424150516232, 0.9507879247418837), z_dir=(0, 0.9507879247418837, -0.30984241505162313))) as fillet1_piece_18b_section:
        with BuildLine():
            CenterArc((FILLET1_R, -FILLET1_R), FILLET1_R, 90, 90)
            Line((0, -FILLET1_R), (-FILLET1_R * 0.02, -FILLET1_R))
            Line((-FILLET1_R * 0.02, -FILLET1_R), (-FILLET1_R * 0.02, FILLET1_R * 0.02))
            Line((-FILLET1_R * 0.02, FILLET1_R * 0.02), (FILLET1_R, FILLET1_R * 0.02))
            Line((FILLET1_R, FILLET1_R * 0.02), (FILLET1_R, 0))
        make_face()
    fillet1_piece_18b = extrude(amount=20.91170631, mode=Mode.PRIVATE)
    fillet1_piece_18b = split(fillet1_piece_18b, bisect_by=Plane(origin=(23.756407905, 20.539413838, 0.382821003), z_dir=(0, 0.30984241505162313, -0.9507879247418837)), keep=Keep.TOP, mode=Mode.PRIVATE)
    fillet1_piece_18 = fillet1_piece_18a & fillet1_piece_18b
    add(fillet1_piece_18, mode=Mode.SUBTRACT)

    # Fillet2
    fillet2_edges = [part.edges().sort_by_distance(p)[0] for p in [
        (23, 40, -3),
        (23, 40, 3),
        (1, 40, 3),
        (1, 40, -3),
    ]]
    fillet(fillet2_edges, radius=FILLET2_R)

    # Sketch3 → Boss-Extrude2 (add)
    with BuildSketch(Plane(origin=(0, 60, 0), x_dir=(1, 0, 0), z_dir=(0, 1, 0))):
        with BuildLine():
            Line((22, 3), (2, 3))
            ThreePointArc((2, 3), (1.292893219, 2.707106781), (1, 2))
            Line((1, 2), (1, -2))
            ThreePointArc((1, -2), (1.292893219, -2.707106781), (2, -3))
            Line((2, -3), (22, -3))
            ThreePointArc((22, -3), (22.707106781, -2.707106781), (23, -2))
            Line((23, -2), (23, 2))
            ThreePointArc((23, 2), (22.707106781, 2.707106781), (22, 3))
        make_face()
    extrude(amount=BOSS_EXTRUDE2_DEPTH)


solid = part.part
